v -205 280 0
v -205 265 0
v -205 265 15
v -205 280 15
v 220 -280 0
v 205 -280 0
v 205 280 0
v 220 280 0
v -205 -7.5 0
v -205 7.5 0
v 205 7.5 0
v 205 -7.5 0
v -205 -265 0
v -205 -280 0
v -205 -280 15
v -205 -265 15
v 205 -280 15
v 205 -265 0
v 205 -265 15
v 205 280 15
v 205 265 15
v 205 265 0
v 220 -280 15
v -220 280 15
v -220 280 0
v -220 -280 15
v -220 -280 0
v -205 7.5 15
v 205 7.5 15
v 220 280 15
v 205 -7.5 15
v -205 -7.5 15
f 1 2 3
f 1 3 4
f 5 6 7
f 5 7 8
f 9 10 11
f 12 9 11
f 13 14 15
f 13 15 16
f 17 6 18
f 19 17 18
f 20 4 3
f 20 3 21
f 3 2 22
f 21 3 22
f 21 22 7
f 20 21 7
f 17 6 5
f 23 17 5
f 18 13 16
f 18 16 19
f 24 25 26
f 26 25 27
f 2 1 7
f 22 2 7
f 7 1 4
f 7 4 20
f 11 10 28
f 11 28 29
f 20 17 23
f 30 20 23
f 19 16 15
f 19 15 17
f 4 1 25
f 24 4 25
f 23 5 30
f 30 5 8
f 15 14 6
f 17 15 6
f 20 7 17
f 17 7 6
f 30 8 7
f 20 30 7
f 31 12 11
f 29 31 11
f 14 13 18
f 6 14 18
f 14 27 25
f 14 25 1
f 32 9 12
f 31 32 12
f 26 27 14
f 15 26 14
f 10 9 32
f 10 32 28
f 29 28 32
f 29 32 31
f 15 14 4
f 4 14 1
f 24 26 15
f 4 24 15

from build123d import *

# Parameters (mm, degrees)
F1_DEPTH = 15
F0_W     = 410
F0_H     = 15
F2_DEPTH = 15


with BuildPart() as f1:
    # F0 (on Top) → F1 (new body)
    with BuildSketch(Plane.XY):
        Polygon((-205, 265), (-205, 280), (-220, 280), (-220, -280), (-205, -280), (-205, -265), (-205, -7.5), (-205, 7.5), align=None)
        Polygon((220, -280), (220, 280), (205, 280), (205, 265), (205, 7.5), (205, -7.5), (205, -265), (205, -280), align=None)
    extrude(amount=F1_DEPTH)


with BuildPart() as f2:
    # F0 (on Top) → F2 (new body)
    with BuildSketch(Plane.XY):
        with Locations((0, 272.5)):
            Rectangle(F0_W, F0_H)
        Rectangle(F0_W, F0_H)
        with Locations((0, -272.5)):
            Rectangle(F0_W, F0_H)
    extrude(amount=F2_DEPTH)


solid = Compound([f1.part, f2.part])
